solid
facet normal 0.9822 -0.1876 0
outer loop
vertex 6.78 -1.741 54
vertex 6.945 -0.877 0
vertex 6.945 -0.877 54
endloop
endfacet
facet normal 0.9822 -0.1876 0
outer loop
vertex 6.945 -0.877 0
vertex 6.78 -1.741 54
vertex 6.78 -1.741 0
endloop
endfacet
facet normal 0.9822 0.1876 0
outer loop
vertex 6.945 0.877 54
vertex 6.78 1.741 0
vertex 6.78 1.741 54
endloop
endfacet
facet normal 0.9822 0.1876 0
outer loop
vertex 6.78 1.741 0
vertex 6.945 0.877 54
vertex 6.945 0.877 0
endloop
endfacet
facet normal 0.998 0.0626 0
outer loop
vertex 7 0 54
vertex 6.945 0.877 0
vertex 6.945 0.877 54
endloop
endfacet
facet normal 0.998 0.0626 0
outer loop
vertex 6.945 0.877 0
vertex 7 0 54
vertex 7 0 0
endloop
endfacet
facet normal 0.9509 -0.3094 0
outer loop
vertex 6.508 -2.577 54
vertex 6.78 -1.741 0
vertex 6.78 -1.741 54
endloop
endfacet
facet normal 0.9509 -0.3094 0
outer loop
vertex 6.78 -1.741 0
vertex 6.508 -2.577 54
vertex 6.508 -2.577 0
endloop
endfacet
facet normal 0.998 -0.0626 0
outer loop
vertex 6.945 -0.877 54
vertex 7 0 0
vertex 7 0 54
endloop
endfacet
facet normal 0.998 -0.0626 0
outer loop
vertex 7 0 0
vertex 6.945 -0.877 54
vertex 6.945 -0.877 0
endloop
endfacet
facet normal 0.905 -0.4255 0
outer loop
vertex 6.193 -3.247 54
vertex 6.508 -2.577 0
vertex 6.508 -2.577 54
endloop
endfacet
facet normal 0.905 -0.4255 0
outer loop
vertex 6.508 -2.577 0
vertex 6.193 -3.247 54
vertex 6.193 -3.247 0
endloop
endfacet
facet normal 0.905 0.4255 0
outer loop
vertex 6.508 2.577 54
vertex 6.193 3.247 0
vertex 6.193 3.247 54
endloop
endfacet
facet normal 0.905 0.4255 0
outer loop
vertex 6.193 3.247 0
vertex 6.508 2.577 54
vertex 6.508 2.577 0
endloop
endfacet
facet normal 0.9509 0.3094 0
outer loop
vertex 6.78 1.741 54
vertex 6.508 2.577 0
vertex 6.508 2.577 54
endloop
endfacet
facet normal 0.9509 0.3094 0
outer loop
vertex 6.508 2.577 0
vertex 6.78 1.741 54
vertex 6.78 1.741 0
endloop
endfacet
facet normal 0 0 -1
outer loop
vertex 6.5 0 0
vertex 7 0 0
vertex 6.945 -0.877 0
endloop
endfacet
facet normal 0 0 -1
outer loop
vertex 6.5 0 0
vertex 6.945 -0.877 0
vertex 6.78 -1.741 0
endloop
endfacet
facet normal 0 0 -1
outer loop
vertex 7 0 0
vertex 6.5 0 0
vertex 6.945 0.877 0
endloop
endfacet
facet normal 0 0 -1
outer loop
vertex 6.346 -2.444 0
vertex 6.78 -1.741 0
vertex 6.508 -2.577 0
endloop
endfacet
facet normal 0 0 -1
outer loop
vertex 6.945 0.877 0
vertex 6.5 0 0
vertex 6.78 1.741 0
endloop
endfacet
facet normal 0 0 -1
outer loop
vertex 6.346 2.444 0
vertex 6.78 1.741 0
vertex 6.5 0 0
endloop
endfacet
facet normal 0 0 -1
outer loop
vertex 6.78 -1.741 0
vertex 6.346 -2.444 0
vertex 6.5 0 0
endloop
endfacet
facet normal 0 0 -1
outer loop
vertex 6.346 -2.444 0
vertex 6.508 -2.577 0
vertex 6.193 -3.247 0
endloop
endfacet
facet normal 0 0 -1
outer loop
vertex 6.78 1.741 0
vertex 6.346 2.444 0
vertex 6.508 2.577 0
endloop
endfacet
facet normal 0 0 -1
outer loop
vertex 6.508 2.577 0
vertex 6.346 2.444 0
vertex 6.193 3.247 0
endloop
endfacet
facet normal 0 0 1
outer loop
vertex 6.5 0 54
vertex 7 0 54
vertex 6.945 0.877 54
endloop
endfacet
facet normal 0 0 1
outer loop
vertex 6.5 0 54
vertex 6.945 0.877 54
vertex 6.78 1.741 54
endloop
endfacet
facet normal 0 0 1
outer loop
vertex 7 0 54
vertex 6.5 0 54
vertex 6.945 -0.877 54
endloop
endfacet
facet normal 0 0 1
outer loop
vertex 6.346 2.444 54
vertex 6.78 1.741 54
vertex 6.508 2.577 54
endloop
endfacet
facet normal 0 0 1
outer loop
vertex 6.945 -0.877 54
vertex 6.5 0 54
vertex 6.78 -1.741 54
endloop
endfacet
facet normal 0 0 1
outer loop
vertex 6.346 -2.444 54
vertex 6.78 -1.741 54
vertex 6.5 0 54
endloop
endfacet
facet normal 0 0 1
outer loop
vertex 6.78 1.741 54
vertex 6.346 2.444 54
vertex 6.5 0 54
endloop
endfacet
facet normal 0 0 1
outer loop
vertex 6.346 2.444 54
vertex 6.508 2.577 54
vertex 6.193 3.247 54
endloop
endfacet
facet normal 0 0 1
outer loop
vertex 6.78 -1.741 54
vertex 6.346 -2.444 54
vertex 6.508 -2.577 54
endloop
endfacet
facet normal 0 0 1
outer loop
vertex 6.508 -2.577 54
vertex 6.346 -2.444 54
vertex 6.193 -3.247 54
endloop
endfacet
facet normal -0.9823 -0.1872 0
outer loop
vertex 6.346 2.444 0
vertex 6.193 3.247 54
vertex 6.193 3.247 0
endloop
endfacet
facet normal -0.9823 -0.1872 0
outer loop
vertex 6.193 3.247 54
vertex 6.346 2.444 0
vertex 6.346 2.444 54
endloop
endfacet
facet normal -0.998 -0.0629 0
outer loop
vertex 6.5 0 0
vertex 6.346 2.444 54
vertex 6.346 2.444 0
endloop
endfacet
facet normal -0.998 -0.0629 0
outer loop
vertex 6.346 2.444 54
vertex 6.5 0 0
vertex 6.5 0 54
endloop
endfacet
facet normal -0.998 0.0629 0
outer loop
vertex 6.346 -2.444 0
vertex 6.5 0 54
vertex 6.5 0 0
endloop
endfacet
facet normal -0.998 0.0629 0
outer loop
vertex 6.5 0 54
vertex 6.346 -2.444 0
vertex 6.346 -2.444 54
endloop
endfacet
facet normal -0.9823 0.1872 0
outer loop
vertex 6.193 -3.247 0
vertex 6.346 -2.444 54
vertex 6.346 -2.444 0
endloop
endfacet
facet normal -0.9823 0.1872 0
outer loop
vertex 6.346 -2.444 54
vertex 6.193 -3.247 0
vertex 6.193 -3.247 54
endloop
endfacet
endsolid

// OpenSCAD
$fn = 50;


difference() {
	union() {
		cylinder(h = 54, r = 7.0000000000);
		translate(v = [-16.0000000000, 0, 0]) {
			cylinder(h = 54, r = 7.0000000000);
		}
	}
	union() {
		cylinder(h = 54, r = 3.2500000000);
		cylinder(h = 54, r = 1.8000000000);
		cylinder(h = 54, r = 1.8000000000);
		cylinder(h = 54, r = 1.8000000000);
		translate(v = [-20.5000000000, 0, 0]) {
			hull() {
				translate(v = [-3.7500000000, 0.0000000000, 0]) {
					cylinder(h = 54, r = 10.5000000000);
				}
				translate(v = [3.7500000000, 0.0000000000, 0]) {
					cylinder(h = 54, r = 10.5000000000);
				}
				translate(v = [-3.7500000000, -0.0000000000, 0]) {
					cylinder(h = 54, r = 10.5000000000);
				}
				translate(v = [3.7500000000, -0.0000000000, 0]) {
					cylinder(h = 54, r = 10.5000000000);
				}
			}
		}
		translate(v = [-13.0000000000, 0, 0.0000000000]) {
			cylinder(h = 54, r = 19.5000000000);
		}
	}
}
